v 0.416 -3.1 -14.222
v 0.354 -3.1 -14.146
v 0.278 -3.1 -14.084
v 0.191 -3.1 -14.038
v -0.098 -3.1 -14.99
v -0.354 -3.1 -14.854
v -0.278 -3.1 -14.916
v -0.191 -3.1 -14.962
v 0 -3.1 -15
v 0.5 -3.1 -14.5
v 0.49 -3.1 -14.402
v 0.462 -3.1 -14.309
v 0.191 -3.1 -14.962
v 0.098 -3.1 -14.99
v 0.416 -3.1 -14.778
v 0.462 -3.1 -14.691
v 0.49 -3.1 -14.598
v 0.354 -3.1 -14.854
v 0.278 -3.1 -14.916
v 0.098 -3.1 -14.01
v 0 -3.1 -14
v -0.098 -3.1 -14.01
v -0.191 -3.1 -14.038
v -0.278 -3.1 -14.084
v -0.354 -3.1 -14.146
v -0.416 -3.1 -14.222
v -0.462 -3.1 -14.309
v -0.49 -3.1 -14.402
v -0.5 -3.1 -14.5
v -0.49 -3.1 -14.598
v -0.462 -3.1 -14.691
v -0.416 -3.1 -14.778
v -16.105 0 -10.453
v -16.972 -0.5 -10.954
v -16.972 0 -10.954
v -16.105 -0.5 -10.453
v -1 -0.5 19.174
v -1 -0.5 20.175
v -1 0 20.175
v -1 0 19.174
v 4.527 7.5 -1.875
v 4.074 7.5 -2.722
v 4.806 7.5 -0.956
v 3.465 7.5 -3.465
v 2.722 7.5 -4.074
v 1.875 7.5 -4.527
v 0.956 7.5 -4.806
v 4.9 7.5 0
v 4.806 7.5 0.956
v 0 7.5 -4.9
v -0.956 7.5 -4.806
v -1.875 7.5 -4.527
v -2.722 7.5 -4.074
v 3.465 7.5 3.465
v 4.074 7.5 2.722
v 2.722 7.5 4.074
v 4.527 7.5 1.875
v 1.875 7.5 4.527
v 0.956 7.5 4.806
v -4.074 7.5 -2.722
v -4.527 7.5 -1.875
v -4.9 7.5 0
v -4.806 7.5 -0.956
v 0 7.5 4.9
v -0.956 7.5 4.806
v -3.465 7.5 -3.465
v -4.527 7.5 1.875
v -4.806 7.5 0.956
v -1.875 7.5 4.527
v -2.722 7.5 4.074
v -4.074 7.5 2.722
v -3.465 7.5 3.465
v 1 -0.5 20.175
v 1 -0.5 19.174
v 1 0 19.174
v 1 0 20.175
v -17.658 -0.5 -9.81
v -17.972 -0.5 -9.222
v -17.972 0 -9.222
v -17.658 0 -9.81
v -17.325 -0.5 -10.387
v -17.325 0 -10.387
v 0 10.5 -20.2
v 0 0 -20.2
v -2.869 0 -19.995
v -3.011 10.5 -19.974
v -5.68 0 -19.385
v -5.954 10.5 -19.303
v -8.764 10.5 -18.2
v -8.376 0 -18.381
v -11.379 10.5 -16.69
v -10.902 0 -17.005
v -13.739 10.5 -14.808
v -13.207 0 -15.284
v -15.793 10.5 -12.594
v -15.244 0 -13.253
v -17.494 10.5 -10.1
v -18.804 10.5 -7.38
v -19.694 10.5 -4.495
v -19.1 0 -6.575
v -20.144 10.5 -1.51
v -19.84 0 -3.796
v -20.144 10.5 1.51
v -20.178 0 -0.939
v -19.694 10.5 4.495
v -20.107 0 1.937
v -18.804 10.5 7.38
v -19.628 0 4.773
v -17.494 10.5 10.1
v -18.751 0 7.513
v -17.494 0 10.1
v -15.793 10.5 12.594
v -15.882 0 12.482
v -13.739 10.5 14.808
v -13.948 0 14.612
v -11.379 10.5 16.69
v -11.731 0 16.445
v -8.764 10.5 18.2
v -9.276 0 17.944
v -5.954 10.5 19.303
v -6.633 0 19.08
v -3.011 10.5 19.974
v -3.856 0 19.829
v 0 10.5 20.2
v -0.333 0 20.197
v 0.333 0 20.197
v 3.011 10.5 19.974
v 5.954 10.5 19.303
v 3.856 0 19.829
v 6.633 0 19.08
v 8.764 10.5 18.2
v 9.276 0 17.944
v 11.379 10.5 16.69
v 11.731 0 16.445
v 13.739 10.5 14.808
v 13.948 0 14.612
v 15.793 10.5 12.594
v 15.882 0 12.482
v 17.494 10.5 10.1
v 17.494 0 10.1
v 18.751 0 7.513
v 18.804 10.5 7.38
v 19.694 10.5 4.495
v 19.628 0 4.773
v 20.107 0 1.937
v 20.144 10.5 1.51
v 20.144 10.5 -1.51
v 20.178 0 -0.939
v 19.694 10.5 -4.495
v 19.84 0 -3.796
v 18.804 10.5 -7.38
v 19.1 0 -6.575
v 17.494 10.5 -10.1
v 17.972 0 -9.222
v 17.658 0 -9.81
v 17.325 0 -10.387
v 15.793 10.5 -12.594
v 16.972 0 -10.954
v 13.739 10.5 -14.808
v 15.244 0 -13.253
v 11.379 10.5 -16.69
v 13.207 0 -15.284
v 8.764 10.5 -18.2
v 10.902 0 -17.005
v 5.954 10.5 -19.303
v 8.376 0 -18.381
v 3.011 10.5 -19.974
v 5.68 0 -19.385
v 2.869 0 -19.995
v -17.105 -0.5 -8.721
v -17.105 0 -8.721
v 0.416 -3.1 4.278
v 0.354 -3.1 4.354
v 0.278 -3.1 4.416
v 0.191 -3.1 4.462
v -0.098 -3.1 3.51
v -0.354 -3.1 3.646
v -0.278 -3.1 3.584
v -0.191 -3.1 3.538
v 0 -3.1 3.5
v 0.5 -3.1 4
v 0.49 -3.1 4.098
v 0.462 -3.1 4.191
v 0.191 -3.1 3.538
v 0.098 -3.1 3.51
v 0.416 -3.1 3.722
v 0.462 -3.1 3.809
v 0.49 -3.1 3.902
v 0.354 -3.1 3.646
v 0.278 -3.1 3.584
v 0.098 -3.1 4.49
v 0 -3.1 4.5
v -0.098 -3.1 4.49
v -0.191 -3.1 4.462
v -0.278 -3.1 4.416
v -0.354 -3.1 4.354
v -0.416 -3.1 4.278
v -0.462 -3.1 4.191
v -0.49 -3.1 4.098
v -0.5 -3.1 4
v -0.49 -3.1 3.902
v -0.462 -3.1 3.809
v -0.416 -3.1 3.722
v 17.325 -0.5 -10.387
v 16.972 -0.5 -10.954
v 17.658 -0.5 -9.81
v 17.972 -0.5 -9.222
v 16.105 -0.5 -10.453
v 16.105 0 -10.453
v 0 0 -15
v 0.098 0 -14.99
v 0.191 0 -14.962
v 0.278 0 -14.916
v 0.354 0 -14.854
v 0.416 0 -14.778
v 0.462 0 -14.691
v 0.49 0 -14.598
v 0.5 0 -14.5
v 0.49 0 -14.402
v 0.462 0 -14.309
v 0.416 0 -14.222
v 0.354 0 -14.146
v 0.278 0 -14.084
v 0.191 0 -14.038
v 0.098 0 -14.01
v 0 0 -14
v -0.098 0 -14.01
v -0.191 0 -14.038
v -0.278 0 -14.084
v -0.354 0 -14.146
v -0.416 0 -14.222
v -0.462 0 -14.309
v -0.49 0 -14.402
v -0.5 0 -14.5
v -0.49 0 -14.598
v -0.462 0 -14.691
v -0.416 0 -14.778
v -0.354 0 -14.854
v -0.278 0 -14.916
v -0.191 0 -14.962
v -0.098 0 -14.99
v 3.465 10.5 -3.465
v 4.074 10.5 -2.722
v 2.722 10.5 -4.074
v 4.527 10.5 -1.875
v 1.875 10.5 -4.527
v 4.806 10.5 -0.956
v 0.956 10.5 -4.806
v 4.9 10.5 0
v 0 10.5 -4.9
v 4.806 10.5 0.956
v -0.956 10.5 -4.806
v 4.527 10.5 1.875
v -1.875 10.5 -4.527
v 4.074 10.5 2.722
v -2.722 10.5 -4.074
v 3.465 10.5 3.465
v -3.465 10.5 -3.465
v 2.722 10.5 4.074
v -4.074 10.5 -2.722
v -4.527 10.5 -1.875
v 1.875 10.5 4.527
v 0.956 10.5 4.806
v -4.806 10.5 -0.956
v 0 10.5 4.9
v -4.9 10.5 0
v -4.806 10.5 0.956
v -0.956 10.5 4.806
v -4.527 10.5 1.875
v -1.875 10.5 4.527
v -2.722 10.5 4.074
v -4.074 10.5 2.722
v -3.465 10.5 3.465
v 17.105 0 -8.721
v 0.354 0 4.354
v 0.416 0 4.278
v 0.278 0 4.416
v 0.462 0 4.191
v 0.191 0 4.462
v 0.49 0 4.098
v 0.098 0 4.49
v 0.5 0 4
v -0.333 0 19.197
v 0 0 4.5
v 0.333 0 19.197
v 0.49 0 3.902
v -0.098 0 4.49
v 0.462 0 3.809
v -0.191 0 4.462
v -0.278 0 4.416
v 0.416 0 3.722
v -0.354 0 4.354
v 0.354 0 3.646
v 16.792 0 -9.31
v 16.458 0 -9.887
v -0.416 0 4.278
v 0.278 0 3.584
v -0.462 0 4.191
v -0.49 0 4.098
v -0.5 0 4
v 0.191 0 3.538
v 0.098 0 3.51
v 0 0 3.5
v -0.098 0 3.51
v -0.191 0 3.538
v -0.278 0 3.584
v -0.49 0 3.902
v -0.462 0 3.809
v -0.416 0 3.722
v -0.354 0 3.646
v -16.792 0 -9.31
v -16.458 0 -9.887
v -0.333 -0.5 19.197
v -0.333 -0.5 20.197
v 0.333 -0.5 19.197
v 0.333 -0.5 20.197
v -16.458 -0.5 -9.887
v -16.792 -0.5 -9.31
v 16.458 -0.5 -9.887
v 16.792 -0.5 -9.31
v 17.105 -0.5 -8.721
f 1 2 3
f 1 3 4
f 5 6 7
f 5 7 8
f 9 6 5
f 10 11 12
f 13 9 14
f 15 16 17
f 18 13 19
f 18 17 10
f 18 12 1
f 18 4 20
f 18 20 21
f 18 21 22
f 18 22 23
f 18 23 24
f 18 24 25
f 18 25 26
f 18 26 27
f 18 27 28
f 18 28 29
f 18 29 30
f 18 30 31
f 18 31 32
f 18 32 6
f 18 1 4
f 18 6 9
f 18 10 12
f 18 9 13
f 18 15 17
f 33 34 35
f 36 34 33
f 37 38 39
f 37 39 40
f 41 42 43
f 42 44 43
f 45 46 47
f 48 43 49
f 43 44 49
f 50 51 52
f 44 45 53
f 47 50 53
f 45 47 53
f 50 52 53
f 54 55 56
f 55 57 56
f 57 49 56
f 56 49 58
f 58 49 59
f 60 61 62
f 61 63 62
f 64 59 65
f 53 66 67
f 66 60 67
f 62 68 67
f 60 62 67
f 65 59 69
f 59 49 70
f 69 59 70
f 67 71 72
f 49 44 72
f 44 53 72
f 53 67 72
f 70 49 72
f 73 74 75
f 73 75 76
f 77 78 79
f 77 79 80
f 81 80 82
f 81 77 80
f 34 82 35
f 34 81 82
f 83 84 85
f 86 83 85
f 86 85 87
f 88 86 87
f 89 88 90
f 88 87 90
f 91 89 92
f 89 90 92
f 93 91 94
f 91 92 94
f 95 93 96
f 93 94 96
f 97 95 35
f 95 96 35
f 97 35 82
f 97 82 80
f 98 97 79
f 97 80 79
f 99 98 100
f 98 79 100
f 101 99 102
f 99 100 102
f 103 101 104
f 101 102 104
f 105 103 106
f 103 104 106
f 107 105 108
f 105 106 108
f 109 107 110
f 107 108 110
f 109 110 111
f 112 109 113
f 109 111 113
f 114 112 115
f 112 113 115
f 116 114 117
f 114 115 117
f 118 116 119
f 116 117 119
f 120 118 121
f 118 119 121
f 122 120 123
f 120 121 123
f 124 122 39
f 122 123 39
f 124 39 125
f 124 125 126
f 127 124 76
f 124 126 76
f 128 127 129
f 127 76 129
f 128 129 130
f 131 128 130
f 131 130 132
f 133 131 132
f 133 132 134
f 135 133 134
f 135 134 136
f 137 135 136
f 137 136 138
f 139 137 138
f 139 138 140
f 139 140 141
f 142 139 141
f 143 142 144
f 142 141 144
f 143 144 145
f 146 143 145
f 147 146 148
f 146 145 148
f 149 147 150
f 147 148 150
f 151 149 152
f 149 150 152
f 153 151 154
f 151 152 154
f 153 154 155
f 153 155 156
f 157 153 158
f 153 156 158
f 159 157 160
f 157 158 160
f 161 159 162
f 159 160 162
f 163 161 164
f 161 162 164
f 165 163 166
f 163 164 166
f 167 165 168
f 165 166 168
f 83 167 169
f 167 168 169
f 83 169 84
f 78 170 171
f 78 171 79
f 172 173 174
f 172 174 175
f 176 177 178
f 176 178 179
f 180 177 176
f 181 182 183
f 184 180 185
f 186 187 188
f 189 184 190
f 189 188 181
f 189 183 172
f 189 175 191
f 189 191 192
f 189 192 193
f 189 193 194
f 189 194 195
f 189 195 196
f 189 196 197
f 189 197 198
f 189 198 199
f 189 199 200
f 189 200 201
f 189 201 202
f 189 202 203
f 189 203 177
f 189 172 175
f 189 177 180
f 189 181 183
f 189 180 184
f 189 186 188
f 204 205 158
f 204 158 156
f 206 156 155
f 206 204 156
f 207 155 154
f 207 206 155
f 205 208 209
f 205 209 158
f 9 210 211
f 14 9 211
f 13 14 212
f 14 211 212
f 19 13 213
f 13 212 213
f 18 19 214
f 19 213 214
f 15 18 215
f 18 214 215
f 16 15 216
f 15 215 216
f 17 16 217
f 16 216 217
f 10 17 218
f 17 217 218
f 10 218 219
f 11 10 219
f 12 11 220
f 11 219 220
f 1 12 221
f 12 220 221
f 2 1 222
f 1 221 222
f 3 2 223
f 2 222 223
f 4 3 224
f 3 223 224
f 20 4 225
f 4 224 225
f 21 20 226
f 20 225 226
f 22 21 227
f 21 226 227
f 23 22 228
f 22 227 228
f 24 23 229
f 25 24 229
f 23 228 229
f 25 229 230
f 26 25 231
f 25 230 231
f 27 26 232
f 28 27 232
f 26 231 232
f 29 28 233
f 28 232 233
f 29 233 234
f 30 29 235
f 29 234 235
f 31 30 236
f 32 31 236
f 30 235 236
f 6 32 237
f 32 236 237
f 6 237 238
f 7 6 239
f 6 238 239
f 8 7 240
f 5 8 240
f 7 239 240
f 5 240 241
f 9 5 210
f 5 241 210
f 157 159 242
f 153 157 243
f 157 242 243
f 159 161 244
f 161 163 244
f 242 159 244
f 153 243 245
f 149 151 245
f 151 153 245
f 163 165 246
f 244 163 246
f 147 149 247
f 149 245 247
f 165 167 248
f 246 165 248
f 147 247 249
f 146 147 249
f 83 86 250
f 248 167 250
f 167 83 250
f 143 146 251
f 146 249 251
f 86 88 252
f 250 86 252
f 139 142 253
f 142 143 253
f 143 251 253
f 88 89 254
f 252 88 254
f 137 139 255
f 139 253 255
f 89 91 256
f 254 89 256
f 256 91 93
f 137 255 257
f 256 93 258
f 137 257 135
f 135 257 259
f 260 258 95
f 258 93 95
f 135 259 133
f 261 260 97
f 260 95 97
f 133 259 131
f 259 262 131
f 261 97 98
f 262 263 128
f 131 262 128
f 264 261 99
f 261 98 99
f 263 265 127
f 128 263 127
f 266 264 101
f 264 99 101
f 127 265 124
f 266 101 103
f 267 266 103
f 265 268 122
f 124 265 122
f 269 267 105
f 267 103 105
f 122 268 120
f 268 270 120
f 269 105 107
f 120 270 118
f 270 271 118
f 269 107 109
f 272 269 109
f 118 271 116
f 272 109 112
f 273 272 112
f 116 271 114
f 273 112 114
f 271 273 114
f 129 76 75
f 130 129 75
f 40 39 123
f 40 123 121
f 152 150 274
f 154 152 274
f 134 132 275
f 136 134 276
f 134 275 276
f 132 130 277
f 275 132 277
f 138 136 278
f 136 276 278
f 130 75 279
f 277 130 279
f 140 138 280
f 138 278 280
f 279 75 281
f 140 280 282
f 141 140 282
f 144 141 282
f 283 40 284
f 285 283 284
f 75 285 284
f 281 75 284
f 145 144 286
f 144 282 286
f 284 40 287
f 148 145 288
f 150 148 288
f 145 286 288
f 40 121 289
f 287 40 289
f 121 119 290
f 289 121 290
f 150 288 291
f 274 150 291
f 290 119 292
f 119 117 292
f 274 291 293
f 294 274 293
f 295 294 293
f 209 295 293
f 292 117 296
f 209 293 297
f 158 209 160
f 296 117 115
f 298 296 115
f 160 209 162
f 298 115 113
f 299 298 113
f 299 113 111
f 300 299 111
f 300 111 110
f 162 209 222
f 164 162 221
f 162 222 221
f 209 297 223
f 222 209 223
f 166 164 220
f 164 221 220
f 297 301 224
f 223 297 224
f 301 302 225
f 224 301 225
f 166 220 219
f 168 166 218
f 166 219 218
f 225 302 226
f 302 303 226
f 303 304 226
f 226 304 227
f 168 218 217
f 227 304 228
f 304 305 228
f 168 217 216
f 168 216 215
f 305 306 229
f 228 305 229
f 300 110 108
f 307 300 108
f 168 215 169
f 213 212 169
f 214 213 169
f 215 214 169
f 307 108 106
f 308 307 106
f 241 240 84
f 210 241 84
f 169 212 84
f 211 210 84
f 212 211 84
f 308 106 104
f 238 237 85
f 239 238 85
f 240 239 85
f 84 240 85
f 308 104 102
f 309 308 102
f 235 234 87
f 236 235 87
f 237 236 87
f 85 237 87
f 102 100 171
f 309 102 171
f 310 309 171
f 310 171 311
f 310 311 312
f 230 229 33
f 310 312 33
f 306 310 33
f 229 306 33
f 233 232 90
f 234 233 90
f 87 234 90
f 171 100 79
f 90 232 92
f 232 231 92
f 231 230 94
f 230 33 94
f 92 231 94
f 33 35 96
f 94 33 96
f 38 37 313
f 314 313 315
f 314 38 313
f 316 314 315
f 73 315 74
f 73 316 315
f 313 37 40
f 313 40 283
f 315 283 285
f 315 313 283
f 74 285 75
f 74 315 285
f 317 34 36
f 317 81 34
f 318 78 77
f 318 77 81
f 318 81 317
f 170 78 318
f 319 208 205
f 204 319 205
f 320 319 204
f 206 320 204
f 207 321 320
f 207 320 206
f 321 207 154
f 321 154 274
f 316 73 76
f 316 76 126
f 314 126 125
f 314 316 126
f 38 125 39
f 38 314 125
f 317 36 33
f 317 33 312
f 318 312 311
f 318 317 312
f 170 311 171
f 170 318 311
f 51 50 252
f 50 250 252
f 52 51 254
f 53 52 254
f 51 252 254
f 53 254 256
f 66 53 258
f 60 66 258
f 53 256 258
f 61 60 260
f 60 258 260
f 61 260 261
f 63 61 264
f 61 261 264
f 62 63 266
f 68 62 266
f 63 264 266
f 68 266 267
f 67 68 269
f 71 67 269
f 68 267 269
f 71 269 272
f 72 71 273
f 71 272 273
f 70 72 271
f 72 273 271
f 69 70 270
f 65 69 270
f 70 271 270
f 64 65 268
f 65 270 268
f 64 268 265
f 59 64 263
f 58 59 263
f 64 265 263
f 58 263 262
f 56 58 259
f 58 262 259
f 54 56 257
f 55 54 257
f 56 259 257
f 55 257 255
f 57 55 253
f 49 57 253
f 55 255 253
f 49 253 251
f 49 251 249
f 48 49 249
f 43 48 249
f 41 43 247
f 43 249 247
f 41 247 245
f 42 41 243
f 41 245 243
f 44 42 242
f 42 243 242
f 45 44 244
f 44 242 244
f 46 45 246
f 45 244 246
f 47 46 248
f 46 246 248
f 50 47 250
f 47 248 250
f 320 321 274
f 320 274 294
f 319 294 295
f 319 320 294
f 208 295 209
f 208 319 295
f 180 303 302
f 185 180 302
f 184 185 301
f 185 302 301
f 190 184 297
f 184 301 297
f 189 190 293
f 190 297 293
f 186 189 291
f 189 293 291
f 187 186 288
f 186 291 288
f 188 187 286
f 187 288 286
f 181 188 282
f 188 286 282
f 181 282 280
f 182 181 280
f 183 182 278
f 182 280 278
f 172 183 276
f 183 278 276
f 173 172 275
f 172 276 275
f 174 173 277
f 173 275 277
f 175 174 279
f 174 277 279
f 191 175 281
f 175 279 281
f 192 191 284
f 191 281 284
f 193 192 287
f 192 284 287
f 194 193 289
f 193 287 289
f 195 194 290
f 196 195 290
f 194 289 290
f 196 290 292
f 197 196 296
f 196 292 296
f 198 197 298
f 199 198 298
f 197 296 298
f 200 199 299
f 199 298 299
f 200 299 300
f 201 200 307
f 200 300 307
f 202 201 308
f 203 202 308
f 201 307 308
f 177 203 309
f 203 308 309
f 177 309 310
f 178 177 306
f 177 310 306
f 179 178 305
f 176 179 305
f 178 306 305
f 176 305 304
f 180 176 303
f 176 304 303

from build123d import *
from build123d.topology import SkipClean

# Parameters (mm, degrees)
BOSS_EXTRUDE1_START = 0.5
BOSS_EXTRUDE1_DEPTH = 0.5
SKETCH3_R           = 0.5
BOSS_EXTRUDE2_DEPTH = 3.1


with BuildPart() as part:
    # Sketch1 → Revolve1 (revolve)
    with BuildSketch(Plane(origin=(0, 0, 0), x_dir=(0, 0, -1), z_dir=(1, 0, 0))):
        Polygon((20.2, 10.5), (20.2, 0), (0, 0), (0, 7.5), (4.9, 7.5), (4.9, 10.5), align=None)
    revolve(axis=Axis((0, 0, 0), (0, 1, 0)))

    # Sketch2 → Boss-Extrude1 (add)
    with SkipClean():  # the faces are left unmerged after this step: merging them gives an invalid solid
        with BuildSketch(Plane.XZ.offset(BOSS_EXTRUDE1_START)):
            with BuildLine():
                Line((-1, 20.175232341), (-1, 19.173940649))
                ThreePointArc((-1, 19.173940649), (0, 19.2), (1, 19.173940649))
                Line((1, 19.173940649), (1, 20.175232341))
                ThreePointArc((1, 20.175232341), (0, 20.2), (-1, 20.175232341))
            make_face()
            with BuildLine():
                Line((17.972263734, -9.221590767), (17.105119692, -8.720944921))
                ThreePointArc((17.105119692, -8.720944921), (16.627687753, -9.6), (16.105119692, -10.452995728))
                Line((16.105119692, -10.452995728), (16.972263734, -10.953641574))
                ThreePointArc((16.972263734, -10.953641574), (17.493713156, -10.1), (17.972263734, -9.221590767))
            make_face()
            with BuildLine():
                Line((-16.972263734, -10.953641574), (-16.105119692, -10.452995728))
                ThreePointArc((-16.105119692, -10.452995728), (-16.627687753, -9.6), (-17.105119692, -8.720944921))
                Line((-17.105119692, -8.720944921), (-17.972263734, -9.221590767))
                ThreePointArc((-17.972263734, -9.221590767), (-17.493713156, -10.1), (-16.972263734, -10.953641574))
            make_face()
        extrude(amount=-BOSS_EXTRUDE1_DEPTH)

    # Sketch3 → Boss-Extrude2 (add)
    with SkipClean():  # the faces are left unmerged after this step: merging them gives an invalid solid
        with BuildSketch(Plane.XZ):
            with Locations(Location((0, 4, 0), (0, 0, 270))):
                Circle(SKETCH3_R)
            with Locations(Location((0, -14.5, 0), (0, 0, 270))):
                Circle(SKETCH3_R)
        extrude(amount=BOSS_EXTRUDE2_DEPTH)


solid = part.part
